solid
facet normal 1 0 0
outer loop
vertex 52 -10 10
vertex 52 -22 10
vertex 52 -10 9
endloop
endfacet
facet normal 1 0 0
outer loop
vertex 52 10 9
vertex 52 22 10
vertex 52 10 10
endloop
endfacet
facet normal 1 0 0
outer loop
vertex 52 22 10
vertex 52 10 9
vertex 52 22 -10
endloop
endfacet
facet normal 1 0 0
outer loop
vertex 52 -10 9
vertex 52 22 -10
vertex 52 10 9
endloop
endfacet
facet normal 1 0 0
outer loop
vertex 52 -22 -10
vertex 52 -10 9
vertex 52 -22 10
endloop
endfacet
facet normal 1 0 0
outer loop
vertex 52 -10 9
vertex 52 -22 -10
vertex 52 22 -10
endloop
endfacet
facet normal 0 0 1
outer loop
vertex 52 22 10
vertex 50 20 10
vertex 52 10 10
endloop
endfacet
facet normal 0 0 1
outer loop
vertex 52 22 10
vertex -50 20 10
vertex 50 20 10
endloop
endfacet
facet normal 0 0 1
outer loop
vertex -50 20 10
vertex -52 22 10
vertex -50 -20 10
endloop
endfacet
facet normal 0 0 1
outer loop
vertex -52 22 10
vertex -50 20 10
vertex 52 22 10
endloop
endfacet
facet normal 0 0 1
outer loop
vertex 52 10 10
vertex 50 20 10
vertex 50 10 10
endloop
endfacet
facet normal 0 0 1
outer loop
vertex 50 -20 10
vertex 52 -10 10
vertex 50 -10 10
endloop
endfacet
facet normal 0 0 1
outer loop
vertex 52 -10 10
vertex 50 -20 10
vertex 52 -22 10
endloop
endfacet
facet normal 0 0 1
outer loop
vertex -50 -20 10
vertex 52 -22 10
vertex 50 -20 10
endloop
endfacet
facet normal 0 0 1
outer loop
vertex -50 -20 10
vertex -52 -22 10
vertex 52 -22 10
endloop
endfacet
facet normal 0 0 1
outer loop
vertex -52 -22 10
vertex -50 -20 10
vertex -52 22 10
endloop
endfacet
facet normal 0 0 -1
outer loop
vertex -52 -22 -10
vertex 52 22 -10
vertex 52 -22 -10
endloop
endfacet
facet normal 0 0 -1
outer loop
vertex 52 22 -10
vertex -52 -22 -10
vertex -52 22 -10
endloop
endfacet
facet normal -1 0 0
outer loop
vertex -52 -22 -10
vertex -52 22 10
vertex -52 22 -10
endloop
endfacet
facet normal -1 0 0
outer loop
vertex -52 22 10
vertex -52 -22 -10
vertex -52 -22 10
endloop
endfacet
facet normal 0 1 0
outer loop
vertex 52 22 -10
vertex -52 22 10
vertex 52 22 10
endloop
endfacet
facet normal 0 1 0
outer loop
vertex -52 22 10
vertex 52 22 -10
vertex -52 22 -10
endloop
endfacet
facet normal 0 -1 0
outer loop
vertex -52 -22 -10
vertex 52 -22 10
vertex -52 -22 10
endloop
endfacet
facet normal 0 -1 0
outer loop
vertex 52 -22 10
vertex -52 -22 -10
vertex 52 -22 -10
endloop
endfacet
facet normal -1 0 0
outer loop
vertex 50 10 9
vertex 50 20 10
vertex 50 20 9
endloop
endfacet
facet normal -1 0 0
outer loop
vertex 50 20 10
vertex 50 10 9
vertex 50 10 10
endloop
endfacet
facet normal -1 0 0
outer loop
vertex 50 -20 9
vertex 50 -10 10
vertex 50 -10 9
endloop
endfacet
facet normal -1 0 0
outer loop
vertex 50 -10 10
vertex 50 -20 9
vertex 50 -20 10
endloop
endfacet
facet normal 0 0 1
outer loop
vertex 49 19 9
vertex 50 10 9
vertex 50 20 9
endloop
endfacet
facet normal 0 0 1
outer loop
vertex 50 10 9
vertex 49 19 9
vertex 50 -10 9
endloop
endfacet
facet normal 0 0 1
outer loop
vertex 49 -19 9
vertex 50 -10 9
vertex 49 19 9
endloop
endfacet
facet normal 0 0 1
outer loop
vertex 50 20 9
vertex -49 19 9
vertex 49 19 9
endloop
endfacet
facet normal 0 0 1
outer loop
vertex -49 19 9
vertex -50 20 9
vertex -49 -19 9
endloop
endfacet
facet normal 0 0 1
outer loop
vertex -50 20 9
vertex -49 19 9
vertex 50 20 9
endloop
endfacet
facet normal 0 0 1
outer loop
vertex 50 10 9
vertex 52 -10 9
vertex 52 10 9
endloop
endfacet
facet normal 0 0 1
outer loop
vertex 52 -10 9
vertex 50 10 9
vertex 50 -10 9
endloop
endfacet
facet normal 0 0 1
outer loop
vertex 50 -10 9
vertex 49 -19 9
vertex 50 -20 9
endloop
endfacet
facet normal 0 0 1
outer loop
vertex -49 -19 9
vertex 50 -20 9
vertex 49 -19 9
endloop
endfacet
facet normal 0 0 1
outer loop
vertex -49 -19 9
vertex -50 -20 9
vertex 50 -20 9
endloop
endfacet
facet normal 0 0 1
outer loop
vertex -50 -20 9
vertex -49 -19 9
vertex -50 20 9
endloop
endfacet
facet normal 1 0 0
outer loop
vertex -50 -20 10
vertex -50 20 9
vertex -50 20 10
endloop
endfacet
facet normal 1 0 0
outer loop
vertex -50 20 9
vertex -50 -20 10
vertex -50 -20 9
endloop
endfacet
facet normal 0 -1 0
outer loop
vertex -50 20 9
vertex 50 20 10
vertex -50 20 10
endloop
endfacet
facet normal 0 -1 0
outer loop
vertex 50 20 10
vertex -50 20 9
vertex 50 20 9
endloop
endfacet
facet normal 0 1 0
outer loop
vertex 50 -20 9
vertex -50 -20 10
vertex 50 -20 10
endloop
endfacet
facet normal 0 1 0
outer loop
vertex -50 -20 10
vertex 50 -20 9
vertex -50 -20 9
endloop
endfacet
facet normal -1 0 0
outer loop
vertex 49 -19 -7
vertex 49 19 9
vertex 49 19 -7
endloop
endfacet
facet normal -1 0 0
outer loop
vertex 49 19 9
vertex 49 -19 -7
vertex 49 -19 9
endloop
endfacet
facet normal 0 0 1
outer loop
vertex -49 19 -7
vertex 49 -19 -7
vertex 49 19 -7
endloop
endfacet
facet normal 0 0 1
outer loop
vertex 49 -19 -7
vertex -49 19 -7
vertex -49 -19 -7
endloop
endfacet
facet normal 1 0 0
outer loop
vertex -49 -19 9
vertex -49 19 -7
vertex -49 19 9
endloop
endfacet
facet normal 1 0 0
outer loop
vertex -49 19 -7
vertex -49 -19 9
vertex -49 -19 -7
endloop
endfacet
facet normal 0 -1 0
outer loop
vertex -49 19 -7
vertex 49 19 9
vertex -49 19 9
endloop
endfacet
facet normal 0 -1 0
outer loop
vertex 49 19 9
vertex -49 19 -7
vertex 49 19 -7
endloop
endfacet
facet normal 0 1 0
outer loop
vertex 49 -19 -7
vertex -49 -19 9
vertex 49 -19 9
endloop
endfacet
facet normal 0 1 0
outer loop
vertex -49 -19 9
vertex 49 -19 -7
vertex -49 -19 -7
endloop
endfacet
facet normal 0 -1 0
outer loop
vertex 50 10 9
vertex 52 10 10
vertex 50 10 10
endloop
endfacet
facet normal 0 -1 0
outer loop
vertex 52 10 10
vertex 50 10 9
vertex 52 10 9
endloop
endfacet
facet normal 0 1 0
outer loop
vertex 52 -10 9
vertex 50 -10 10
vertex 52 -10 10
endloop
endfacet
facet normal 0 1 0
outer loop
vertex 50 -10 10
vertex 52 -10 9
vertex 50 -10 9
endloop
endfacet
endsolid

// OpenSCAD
// UV matrix dimensions, mm [length, width, height]
matrix_dimensions = [100, 40, 1];

// main body depth, mm
main_body_depth = 20;

wall_thin = 2;
matrix_margin = 2;

cut_depth = matrix_dimensions[2];
cut_widht = 20;

module main_body()
{
    main_body_length = matrix_dimensions[0] + (wall_thin * 2);
    main_body_width = matrix_dimensions[1] + (wall_thin * 2);
    cube([main_body_length, main_body_width, main_body_depth], center=true);
}

difference()
    {
        main_body();

        // cut matrix
        translate([0, 0, (main_body_depth / 2) - matrix_dimensions[2] / 2 ])
            cube(matrix_dimensions, center=true);

        // cut other
        translate([0, 0, wall_thin])
            cube([matrix_dimensions[0] - matrix_margin,
                  matrix_dimensions[1] - matrix_margin,
                  main_body_depth - matrix_margin], center=true);

        // cut cable
        translate([matrix_dimensions[0] / 2 + wall_thin / 2, 0, (main_body_depth / 2) - cut_depth / 2])
            #cube([wall_thin, cut_widht, cut_depth], center=true);
    }
